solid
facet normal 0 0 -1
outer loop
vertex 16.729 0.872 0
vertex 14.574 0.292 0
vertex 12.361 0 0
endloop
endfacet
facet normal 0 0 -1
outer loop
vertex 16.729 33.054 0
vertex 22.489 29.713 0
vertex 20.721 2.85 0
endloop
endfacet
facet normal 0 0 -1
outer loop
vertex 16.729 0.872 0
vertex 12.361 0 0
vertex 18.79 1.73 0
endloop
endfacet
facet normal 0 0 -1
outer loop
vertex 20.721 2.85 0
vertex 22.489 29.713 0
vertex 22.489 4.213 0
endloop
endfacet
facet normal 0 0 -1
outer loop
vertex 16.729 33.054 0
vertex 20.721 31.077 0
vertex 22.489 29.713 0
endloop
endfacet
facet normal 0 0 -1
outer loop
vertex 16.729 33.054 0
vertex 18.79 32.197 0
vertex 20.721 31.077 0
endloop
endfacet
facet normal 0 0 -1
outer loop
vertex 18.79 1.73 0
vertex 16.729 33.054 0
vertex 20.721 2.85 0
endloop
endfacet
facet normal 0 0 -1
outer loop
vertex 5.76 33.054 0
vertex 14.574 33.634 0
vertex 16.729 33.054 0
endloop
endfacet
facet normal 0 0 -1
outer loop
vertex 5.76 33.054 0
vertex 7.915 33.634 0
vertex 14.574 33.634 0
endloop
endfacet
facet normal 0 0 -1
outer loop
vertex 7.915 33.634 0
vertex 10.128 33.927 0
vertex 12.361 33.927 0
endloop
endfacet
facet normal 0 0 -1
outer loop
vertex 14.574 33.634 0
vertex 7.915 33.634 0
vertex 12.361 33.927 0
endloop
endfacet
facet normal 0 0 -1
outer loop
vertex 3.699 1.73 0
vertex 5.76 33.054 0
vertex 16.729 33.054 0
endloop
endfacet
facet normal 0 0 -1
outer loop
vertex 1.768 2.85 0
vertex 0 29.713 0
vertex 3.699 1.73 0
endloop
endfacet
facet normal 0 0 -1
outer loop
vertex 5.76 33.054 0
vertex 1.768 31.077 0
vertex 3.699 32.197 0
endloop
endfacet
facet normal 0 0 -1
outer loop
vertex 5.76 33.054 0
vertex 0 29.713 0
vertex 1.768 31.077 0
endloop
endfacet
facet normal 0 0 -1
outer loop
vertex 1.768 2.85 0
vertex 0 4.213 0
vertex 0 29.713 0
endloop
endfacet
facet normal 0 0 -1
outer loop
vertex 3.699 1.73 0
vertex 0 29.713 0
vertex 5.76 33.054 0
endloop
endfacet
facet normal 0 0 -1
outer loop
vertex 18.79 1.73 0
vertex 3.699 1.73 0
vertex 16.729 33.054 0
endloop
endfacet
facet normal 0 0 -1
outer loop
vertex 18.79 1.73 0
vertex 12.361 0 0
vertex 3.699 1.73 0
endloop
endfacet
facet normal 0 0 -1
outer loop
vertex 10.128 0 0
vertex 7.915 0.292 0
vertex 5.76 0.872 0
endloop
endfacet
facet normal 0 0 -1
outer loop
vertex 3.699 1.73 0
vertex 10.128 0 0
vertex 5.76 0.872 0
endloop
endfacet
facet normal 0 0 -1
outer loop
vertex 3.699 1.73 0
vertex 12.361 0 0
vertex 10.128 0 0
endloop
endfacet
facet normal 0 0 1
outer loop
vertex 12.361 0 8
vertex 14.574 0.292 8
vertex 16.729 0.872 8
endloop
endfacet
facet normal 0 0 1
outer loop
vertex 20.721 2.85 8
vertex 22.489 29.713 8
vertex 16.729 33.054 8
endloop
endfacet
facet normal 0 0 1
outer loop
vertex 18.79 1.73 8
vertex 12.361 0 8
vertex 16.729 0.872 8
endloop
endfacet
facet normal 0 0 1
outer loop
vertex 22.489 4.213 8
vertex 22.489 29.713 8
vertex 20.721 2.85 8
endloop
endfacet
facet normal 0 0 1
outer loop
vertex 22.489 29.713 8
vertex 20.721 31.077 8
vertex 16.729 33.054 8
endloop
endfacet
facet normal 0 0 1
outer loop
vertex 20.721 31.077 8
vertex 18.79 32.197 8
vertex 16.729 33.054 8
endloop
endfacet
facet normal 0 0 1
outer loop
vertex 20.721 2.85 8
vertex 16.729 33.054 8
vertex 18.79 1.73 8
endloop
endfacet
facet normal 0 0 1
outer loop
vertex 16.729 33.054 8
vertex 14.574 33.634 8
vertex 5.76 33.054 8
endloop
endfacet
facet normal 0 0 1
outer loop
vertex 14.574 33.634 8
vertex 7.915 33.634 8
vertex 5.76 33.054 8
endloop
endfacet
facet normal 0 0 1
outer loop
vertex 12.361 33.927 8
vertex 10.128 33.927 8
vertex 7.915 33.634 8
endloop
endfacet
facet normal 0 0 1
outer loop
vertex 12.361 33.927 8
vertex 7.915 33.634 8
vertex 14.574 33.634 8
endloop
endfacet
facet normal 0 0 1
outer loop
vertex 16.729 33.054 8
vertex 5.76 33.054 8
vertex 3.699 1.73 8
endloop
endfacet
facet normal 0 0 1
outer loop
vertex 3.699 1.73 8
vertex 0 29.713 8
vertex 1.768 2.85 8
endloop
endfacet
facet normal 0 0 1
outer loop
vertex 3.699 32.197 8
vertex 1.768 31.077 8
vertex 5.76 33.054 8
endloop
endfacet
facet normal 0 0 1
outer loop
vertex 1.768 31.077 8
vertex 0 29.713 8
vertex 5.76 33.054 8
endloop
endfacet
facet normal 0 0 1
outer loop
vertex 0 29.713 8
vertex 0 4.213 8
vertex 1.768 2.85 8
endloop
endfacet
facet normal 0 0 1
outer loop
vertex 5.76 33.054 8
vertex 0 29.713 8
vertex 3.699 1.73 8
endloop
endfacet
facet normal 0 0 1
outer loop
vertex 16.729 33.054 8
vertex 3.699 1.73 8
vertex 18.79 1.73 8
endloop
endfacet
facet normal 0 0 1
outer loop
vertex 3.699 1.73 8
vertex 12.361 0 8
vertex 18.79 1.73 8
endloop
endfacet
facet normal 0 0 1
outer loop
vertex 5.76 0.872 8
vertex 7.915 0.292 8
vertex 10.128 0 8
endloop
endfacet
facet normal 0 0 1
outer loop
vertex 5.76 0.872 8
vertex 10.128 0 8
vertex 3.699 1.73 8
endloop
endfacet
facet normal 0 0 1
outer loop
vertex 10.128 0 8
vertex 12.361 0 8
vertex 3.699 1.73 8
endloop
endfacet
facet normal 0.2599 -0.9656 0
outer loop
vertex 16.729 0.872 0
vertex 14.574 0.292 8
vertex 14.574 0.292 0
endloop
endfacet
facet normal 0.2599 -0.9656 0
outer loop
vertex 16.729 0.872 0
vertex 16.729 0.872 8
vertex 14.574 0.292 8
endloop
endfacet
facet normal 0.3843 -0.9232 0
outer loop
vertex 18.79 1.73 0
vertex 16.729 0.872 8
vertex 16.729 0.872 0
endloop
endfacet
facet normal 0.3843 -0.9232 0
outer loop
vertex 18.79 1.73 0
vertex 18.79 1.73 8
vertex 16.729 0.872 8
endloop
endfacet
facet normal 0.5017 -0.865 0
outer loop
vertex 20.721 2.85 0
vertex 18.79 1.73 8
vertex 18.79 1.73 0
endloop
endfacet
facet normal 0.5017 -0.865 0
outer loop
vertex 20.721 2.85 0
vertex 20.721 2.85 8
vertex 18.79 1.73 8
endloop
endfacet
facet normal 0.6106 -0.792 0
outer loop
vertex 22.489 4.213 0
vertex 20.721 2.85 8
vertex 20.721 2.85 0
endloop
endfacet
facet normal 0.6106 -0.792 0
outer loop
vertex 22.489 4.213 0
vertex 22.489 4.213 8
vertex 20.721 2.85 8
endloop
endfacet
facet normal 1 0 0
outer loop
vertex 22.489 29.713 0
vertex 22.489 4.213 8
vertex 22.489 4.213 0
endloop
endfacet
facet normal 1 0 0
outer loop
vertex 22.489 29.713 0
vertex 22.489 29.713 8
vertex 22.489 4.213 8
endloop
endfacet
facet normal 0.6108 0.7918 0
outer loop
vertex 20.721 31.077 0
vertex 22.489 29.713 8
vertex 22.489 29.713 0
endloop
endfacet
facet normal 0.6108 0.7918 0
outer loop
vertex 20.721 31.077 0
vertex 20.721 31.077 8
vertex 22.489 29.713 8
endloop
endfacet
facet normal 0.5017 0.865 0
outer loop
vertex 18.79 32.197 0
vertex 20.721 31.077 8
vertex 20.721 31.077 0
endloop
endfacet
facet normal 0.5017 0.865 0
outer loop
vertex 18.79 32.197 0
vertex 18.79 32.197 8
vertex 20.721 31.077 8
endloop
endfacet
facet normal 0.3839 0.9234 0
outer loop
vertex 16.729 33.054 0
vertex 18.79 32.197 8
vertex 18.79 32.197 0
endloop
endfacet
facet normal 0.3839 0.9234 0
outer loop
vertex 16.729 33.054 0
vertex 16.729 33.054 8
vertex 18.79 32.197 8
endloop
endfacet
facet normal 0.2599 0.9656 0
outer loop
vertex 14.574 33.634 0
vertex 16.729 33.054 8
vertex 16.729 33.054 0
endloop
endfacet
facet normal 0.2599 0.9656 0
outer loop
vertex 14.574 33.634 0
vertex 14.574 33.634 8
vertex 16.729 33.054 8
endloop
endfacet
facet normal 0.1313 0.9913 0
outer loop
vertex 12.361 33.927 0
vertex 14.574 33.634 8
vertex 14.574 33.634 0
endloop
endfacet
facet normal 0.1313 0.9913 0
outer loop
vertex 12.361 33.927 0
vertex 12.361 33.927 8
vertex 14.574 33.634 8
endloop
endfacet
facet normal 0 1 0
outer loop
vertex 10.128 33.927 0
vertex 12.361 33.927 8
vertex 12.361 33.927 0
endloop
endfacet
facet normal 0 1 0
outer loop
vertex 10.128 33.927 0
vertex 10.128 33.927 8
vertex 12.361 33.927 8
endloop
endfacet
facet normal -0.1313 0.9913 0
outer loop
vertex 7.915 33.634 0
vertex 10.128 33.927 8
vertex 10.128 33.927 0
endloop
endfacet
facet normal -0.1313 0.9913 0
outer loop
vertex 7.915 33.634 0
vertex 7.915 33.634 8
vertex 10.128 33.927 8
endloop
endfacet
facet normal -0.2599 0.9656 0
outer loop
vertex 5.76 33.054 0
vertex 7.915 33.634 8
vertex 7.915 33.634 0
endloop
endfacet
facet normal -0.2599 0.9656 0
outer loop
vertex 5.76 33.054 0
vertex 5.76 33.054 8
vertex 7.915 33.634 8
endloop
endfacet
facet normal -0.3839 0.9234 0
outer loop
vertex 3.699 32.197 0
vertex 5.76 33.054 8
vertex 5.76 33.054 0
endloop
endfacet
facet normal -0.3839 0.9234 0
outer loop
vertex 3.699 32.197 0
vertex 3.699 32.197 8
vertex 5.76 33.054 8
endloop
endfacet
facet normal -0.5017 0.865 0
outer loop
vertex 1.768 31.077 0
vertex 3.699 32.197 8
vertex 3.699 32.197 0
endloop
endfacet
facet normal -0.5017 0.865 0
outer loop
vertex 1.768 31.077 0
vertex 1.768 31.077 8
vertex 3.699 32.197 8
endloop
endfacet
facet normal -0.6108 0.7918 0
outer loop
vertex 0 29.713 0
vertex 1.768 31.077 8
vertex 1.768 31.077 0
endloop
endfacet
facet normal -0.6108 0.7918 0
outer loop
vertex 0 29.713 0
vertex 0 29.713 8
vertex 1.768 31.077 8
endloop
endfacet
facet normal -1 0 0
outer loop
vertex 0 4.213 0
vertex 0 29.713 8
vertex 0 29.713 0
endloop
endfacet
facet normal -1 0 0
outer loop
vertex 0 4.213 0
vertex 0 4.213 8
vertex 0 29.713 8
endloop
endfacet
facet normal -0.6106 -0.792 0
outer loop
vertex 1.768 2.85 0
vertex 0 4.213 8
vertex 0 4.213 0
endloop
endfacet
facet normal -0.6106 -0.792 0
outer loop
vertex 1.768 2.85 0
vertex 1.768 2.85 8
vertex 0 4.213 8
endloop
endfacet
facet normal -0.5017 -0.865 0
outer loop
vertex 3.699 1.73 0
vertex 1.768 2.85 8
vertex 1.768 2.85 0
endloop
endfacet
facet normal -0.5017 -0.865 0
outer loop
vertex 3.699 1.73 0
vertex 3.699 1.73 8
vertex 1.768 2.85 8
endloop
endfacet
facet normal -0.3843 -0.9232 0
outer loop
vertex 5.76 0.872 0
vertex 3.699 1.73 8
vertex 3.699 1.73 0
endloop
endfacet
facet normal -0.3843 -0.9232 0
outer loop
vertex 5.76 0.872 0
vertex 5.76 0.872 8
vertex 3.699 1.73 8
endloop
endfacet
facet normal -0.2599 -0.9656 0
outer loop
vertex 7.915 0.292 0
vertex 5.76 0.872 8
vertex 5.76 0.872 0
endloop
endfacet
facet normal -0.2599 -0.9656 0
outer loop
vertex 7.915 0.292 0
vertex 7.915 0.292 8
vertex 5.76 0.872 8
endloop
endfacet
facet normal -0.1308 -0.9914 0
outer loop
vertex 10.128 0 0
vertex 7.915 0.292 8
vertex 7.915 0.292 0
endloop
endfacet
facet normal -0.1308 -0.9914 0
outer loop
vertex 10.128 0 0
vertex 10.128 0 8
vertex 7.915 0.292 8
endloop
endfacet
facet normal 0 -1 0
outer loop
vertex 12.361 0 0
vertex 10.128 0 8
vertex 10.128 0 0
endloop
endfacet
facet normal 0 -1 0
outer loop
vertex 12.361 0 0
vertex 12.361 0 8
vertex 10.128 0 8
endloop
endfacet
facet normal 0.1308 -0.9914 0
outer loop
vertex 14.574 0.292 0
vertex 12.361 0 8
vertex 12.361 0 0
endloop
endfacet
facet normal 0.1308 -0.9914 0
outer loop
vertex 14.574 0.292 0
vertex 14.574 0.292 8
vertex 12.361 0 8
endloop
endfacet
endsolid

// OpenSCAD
$fn = 32;

// ----------------------------------------------------------------------
// Eccentric disc: double_d, 8 mm thick
// ----------------------------------------------------------------------

// --- parameters (mm) ---
profile_height = 8;       // extrusion height
profile_points = 24;      // points of the closed outline

profile = [[22.489, 29.713], [20.721, 31.077], [18.79, 32.197], [16.729, 33.054], [14.574, 33.634], [12.361, 33.927], [10.128, 33.927], [7.915, 33.634], [5.76, 33.054], [3.699, 32.197], [1.768, 31.077], [0, 29.713], [0, 4.213], [1.768, 2.85], [3.699, 1.73], [5.76, 0.872], [7.915, 0.292], [10.128, 0], [12.361, 0], [14.574, 0.292], [16.729, 0.872], [18.79, 1.73], [20.721, 2.85], [22.489, 4.213]];  // single closed polygon, 24 points, counter clockwise

// --- the one profile operation ---
linear_extrude(height = profile_height) polygon(points = profile);
